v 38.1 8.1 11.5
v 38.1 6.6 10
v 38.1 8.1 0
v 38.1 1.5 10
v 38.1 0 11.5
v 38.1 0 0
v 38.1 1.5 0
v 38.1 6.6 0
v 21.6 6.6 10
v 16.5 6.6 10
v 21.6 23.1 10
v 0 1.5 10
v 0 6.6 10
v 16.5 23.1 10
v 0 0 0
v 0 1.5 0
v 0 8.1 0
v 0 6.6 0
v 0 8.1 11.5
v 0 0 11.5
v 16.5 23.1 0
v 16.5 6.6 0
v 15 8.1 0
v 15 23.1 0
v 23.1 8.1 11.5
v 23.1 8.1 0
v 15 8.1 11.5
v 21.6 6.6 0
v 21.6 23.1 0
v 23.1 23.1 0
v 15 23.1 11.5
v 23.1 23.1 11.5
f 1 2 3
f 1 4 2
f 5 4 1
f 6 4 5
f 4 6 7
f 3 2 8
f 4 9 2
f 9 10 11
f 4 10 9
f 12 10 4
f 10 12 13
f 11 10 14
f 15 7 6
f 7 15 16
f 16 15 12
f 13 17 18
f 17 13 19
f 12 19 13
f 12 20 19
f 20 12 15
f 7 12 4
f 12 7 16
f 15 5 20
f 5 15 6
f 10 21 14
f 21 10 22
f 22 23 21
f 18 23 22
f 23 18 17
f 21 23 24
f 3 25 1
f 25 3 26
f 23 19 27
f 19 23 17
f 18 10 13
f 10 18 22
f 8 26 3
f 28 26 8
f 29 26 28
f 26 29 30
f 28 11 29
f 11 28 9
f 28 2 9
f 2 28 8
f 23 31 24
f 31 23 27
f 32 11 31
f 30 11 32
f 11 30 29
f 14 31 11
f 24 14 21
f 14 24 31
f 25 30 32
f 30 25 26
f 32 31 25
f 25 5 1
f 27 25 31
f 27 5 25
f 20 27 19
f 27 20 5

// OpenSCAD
wall_thickness = 1.5;
divider_thickness = 5.1;
wall_height = 10;
wall_length = 15;

cube([2*wall_length+divider_thickness+2*wall_thickness, wall_thickness, wall_height]);
translate([0, divider_thickness+wall_thickness, 0]) 
    cube([wall_length+wall_thickness, wall_thickness, wall_height]);
translate([wall_length+divider_thickness+wall_thickness, divider_thickness+wall_thickness, 0]) 
    cube([wall_length+wall_thickness, wall_thickness, wall_height]);
translate([wall_length, 2*wall_thickness+divider_thickness, 0]) 
    cube([wall_thickness, wall_length, wall_height]);
translate([wall_length+divider_thickness+wall_thickness, 2*wall_thickness+divider_thickness, 0]) 
    cube([wall_thickness, wall_length, wall_height]);
translate([0, 0, wall_height]) 
    cube([2*wall_length+divider_thickness+2*wall_thickness, wall_thickness*2+divider_thickness, wall_thickness]);
translate([wall_length, 2*wall_thickness+divider_thickness, wall_height]) 
    cube([2*wall_thickness+divider_thickness, wall_length, wall_thickness]);
